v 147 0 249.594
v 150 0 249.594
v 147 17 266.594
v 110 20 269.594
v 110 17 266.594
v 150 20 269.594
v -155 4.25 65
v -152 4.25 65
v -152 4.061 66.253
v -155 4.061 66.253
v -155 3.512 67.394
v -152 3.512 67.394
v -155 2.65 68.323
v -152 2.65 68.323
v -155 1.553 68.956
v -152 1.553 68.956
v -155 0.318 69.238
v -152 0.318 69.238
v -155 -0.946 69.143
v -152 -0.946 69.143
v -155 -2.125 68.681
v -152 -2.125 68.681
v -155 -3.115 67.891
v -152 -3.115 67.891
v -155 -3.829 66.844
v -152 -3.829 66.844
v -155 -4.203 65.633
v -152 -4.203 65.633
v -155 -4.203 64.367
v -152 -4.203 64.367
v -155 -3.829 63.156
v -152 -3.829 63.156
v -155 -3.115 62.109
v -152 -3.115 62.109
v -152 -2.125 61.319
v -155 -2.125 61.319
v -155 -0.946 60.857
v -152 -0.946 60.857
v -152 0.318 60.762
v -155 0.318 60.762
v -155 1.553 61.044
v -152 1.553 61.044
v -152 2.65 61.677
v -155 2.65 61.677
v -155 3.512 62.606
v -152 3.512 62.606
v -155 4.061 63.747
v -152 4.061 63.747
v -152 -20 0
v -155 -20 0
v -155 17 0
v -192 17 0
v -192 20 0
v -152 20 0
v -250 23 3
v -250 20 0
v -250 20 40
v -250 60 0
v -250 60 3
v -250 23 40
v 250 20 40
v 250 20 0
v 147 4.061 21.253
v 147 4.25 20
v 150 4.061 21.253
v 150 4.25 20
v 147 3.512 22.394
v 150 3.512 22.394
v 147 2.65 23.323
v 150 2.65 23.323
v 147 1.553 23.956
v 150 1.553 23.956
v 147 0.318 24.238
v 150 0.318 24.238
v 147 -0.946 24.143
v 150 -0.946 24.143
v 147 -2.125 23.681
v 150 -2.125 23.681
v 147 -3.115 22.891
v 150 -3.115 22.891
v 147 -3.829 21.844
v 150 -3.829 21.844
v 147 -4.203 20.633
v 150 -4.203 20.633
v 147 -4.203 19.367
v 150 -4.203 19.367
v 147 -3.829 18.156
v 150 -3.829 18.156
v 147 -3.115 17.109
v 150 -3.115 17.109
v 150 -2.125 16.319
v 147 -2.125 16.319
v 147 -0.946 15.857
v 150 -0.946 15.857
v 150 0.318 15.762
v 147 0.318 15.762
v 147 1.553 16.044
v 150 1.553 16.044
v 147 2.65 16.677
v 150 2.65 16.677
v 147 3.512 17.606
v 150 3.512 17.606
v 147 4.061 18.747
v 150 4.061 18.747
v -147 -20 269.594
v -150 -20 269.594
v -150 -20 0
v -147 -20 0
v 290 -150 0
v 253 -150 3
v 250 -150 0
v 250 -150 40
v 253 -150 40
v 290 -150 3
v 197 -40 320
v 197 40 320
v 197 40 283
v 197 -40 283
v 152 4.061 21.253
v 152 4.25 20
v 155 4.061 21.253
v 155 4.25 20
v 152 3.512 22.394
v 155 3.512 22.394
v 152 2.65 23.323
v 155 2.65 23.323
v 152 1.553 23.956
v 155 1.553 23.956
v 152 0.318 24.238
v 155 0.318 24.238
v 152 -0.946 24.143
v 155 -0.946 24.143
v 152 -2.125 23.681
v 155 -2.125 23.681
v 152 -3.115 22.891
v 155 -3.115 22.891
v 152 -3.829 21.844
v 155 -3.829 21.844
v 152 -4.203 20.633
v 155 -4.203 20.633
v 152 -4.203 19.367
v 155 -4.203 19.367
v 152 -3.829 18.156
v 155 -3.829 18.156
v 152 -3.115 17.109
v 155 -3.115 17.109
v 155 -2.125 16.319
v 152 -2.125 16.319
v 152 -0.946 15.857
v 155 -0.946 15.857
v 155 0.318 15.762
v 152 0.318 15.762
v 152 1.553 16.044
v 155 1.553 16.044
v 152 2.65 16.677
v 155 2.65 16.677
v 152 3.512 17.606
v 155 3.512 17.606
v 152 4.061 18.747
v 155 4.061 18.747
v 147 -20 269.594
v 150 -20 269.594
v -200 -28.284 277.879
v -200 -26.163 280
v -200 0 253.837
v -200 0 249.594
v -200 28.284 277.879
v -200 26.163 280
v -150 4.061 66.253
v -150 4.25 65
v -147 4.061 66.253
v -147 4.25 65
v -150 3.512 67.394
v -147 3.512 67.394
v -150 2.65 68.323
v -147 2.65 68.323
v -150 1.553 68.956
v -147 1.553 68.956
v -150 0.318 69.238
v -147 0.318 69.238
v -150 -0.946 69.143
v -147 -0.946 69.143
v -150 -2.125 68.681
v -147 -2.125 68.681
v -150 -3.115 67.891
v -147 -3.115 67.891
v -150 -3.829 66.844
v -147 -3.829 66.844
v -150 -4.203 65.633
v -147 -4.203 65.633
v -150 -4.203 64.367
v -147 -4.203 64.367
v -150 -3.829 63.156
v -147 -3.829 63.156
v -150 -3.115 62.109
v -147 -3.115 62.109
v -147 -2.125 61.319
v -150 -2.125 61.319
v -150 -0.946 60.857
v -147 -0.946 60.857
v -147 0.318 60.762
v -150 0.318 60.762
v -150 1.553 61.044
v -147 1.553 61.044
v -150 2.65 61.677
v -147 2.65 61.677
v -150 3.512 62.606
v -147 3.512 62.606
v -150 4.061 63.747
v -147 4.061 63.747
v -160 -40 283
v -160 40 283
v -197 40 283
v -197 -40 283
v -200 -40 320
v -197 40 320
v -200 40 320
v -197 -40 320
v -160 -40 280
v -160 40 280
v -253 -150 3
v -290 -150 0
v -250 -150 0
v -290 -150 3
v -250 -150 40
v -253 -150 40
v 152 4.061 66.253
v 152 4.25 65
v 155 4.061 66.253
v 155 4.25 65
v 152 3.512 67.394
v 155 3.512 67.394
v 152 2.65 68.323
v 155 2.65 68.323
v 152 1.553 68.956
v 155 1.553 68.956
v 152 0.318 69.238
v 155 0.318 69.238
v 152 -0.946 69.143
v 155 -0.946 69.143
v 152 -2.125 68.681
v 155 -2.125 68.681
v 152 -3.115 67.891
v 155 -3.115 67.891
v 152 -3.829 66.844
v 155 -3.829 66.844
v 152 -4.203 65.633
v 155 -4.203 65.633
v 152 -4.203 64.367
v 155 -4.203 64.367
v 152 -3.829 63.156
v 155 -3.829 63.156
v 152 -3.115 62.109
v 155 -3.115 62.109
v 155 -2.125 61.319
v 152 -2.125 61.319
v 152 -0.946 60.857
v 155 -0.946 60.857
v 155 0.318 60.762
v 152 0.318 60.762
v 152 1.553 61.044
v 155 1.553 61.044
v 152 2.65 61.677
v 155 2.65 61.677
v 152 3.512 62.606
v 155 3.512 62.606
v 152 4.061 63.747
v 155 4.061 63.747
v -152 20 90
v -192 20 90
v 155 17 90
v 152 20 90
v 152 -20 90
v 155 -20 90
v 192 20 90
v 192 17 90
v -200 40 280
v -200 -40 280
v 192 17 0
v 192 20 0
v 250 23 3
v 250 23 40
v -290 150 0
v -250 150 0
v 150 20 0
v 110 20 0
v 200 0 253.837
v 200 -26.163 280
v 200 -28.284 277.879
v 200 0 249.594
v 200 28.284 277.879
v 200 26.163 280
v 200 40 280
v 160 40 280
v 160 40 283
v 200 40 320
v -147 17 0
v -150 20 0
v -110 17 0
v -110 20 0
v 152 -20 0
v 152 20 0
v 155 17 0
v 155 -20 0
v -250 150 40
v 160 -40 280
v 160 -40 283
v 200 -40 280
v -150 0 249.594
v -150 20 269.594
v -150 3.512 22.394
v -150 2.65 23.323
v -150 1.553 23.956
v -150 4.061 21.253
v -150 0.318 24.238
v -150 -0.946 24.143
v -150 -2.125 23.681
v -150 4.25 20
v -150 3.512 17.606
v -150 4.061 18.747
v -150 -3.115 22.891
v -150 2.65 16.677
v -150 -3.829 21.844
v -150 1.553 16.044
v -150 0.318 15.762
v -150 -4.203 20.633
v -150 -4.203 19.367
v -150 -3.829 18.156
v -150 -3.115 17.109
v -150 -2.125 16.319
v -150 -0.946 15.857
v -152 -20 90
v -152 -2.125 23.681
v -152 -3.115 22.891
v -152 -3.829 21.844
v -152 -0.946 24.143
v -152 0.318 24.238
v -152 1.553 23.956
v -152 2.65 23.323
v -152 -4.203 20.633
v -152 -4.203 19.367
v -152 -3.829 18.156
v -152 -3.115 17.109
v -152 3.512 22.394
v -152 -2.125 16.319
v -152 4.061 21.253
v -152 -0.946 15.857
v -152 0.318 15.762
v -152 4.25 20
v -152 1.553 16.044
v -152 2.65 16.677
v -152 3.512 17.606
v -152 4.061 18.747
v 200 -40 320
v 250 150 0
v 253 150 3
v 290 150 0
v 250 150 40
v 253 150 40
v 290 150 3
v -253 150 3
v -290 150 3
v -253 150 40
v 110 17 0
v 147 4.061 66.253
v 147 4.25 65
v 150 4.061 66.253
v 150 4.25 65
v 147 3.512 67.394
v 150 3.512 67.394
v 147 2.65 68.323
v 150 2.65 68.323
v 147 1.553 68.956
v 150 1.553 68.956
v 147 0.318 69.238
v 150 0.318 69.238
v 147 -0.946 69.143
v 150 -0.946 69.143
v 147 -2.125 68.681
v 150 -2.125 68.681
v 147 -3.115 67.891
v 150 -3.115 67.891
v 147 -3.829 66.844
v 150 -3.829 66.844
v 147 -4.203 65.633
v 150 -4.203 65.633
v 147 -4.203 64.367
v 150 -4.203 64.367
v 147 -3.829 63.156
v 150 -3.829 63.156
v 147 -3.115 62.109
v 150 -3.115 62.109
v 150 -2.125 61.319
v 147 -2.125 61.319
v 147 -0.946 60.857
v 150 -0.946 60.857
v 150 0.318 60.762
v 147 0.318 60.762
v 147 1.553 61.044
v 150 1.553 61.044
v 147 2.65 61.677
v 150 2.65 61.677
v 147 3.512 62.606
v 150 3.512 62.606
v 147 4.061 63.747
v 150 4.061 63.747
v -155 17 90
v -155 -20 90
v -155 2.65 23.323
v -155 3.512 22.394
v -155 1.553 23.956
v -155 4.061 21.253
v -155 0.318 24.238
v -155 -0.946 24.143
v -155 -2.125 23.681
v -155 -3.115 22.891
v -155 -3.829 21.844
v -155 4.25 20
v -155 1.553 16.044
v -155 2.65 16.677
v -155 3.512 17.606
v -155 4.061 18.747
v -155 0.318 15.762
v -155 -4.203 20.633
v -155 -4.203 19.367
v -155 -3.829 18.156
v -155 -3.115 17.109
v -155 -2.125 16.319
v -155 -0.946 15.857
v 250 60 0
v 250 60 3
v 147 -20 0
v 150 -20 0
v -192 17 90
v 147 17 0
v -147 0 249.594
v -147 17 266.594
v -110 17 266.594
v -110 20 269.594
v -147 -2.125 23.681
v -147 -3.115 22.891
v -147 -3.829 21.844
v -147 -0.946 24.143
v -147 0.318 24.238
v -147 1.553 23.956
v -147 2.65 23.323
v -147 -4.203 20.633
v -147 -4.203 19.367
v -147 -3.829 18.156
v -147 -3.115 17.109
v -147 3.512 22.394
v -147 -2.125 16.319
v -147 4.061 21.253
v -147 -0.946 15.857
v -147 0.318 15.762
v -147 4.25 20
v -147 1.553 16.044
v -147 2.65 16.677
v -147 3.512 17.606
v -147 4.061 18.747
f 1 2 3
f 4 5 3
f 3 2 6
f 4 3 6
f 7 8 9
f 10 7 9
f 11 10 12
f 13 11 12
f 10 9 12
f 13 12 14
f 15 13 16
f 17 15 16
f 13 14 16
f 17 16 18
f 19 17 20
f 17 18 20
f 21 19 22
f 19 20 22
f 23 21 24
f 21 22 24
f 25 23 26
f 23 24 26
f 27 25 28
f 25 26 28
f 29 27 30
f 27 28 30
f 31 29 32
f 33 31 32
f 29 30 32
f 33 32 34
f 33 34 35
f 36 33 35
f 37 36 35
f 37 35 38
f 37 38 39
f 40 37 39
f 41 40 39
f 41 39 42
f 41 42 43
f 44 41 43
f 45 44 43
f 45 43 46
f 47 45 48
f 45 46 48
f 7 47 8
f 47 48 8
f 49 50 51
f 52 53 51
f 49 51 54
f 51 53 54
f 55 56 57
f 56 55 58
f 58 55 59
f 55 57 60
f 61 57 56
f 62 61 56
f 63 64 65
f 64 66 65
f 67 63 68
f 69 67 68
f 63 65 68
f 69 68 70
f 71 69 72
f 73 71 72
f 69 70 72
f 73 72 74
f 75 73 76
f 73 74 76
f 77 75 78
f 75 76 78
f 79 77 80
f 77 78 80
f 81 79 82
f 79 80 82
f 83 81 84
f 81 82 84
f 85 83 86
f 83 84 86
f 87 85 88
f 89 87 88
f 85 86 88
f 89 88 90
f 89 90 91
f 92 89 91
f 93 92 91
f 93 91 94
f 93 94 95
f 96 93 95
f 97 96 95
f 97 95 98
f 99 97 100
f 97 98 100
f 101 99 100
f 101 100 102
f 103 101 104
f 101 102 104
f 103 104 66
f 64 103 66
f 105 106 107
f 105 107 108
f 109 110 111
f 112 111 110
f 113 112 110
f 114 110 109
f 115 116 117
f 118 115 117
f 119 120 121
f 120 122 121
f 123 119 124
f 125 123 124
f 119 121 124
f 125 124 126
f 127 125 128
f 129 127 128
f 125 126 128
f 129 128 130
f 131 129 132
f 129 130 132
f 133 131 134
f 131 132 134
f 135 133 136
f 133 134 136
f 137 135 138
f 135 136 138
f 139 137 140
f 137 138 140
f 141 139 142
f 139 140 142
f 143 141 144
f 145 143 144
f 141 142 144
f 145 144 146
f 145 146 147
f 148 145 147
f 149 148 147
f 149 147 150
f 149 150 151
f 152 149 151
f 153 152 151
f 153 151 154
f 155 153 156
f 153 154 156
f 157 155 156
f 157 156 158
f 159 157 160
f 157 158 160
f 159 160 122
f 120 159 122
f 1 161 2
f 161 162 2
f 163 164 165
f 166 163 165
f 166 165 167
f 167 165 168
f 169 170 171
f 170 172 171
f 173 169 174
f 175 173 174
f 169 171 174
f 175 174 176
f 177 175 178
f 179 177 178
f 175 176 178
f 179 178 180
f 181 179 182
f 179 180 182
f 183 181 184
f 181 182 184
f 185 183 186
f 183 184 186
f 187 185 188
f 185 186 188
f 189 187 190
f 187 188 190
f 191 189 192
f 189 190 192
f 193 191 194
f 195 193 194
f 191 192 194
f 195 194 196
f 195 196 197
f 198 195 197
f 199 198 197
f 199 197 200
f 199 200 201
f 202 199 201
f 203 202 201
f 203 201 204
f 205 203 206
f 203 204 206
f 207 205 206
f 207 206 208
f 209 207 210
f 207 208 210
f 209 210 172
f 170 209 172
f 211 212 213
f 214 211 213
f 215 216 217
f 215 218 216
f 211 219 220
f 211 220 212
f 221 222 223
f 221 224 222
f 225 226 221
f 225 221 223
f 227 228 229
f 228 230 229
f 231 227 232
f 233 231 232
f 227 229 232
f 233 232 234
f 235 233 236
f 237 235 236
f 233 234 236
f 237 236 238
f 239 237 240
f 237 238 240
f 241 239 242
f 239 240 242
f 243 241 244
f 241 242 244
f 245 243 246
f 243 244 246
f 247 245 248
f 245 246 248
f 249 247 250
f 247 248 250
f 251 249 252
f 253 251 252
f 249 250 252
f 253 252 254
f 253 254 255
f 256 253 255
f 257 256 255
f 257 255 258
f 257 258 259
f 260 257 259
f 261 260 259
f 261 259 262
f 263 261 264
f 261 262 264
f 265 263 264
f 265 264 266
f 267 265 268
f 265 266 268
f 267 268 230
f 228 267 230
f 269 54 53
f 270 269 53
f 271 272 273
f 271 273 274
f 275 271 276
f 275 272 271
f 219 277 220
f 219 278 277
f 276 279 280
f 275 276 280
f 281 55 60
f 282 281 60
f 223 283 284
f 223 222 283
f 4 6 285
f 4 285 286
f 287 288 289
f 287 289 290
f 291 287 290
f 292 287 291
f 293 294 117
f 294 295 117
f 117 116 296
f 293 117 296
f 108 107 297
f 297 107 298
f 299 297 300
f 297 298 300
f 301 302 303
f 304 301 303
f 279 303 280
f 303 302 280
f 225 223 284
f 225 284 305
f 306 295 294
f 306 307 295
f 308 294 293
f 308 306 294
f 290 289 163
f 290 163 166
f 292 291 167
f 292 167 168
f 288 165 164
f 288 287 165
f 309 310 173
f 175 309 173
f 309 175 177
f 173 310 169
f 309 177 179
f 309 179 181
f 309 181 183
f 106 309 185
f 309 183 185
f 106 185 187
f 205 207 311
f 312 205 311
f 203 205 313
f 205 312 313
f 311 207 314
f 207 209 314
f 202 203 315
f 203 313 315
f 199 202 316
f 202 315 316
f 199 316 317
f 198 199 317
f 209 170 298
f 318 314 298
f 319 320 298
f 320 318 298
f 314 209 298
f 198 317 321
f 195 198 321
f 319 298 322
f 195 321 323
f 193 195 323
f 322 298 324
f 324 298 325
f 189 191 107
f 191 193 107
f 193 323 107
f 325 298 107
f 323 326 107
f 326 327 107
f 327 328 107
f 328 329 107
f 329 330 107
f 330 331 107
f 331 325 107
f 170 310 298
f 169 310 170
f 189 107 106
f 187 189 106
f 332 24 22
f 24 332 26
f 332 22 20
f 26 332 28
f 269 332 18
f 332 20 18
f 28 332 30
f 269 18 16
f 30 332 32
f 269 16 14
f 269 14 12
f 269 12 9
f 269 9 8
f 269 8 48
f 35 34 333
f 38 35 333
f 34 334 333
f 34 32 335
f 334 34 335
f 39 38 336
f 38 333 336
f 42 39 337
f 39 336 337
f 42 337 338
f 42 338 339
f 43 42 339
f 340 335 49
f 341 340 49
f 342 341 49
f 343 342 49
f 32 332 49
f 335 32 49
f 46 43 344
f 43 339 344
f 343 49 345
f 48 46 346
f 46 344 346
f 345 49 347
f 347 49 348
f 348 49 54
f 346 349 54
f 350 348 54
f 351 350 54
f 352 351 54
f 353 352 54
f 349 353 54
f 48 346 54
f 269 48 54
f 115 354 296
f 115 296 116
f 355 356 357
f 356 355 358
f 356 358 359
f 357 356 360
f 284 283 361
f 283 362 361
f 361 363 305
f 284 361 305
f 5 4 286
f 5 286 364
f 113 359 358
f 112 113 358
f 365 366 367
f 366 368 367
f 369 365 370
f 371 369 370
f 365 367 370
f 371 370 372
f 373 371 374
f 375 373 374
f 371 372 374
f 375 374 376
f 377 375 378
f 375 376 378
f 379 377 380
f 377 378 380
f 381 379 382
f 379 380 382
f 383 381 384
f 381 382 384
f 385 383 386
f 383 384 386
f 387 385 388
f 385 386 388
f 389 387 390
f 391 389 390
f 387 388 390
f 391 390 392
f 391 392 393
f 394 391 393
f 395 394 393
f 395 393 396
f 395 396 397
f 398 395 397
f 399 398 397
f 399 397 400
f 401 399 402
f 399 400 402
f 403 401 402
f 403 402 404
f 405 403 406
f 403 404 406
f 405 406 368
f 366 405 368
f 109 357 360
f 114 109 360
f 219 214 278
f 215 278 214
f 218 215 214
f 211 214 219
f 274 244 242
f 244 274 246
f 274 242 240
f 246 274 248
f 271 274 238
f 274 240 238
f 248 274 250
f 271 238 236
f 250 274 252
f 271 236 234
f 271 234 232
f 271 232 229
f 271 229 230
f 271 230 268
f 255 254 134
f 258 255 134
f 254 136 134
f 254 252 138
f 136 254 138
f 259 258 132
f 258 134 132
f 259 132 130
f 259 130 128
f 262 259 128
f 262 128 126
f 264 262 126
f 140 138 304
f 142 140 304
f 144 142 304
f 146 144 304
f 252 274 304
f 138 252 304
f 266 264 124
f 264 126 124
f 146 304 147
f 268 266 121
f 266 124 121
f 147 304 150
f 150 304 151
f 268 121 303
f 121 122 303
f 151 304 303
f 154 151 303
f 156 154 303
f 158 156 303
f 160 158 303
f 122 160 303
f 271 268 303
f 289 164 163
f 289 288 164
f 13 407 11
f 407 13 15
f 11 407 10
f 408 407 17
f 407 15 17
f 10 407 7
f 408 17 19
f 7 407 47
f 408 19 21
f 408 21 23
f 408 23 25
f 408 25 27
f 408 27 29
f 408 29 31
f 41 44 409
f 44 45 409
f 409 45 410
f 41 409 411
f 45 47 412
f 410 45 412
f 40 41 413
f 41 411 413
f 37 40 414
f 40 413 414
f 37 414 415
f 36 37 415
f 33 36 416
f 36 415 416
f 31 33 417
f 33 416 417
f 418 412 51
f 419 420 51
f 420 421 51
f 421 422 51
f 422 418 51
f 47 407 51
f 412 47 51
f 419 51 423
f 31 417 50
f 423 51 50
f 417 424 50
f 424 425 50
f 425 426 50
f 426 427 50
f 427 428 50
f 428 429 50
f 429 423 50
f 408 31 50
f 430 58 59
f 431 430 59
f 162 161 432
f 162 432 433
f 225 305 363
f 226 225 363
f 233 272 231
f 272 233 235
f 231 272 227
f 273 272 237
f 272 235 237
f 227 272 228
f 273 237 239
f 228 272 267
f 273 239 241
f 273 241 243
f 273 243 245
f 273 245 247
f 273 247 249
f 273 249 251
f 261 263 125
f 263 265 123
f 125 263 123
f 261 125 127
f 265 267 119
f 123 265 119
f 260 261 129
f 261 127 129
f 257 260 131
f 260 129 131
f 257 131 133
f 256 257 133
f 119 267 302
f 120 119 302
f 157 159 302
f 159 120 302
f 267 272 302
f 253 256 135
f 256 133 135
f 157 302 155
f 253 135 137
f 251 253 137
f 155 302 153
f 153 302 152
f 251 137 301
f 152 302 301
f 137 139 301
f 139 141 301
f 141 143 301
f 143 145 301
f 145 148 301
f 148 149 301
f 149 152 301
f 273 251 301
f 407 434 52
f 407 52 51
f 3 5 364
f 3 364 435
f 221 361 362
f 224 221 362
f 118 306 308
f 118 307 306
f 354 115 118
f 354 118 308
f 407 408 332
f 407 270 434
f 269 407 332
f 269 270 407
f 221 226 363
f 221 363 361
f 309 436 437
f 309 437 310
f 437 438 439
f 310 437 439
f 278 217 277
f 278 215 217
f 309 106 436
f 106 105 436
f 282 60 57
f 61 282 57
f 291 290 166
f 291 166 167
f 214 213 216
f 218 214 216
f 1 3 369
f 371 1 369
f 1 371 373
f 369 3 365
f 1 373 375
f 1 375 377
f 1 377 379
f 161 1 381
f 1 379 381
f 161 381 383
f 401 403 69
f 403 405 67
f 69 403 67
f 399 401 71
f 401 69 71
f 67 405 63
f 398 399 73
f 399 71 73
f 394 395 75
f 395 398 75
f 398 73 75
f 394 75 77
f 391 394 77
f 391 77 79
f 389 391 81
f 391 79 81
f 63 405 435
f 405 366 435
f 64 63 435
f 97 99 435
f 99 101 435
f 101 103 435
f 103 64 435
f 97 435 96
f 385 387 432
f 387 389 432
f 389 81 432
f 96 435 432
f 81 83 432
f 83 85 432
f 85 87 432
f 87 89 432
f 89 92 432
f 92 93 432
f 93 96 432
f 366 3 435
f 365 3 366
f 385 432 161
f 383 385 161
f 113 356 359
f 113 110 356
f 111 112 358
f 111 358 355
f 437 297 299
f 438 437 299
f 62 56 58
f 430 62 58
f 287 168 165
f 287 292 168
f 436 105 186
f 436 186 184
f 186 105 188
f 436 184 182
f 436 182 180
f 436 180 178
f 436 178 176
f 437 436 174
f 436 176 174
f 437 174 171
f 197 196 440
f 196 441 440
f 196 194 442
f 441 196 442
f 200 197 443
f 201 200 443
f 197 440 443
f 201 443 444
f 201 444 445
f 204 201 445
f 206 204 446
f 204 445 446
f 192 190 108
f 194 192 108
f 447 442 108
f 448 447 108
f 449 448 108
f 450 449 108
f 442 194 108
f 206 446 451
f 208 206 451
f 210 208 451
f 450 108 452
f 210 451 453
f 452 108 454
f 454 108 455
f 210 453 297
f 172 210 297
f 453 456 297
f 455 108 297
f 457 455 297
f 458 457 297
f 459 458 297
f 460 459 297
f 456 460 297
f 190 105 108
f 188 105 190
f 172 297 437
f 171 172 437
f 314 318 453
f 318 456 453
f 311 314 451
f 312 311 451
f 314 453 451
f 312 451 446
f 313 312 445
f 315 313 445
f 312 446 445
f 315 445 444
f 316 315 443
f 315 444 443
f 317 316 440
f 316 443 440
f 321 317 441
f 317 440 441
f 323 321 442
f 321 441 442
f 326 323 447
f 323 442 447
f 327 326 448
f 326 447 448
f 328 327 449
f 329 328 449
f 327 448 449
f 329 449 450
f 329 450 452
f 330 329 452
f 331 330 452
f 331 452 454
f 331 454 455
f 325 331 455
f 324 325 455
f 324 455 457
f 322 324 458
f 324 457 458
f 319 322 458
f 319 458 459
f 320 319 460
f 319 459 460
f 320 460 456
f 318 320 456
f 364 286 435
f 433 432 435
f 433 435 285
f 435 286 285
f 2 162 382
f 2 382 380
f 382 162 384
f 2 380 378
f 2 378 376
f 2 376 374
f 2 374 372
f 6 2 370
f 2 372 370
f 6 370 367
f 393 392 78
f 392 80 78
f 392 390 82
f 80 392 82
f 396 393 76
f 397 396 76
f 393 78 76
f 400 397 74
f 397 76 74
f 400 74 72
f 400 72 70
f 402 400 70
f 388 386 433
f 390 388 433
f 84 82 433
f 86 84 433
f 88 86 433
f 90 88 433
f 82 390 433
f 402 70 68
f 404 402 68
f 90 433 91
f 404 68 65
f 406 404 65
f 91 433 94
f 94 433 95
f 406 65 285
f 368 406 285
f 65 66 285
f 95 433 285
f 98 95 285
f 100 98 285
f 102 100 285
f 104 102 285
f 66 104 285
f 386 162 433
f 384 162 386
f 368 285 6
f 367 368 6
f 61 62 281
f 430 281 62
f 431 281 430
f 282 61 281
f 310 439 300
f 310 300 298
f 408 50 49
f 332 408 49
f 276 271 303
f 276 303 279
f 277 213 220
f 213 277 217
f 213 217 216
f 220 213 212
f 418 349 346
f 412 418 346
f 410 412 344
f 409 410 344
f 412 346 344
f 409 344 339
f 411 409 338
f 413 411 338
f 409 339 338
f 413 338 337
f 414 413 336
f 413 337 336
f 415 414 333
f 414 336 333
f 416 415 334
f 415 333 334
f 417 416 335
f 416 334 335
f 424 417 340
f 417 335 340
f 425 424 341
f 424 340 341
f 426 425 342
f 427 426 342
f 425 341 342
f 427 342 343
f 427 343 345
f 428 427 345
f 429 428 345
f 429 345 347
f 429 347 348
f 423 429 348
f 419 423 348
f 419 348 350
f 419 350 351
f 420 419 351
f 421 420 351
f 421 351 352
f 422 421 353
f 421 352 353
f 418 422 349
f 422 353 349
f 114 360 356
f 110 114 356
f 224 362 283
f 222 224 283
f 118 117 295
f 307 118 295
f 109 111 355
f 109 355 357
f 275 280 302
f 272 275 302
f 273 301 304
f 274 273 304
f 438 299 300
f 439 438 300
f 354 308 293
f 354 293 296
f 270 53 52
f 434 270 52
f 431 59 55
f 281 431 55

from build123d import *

# Parameters (mm, degrees)
F1_DEPTH       = 200
F1_DEPTH_BACK  = 200
F3_DEPTH       = 40
F3_DEPTH_BACK  = 40
F7_DEPTH       = 250
F7_DEPTH_BACK  = 250
F9_DEPTH       = 150
F9_DEPTH_BACK  = 150
F11_DEPTH      = 90
F12_R          = 4.25
F13_DEPTH      = 155
F13_DEPTH_BACK = 155


with BuildPart() as f1:
    # F0 (on Right) → F1 (new body, two sides)
    with BuildSketch(Plane.YZ) as f1_sk:
        Polygon((-26.1629509039, 280), (-28.2842712475, 277.8786796564), (0, 249.594408409), (28.2842712475, 277.8786796564), (26.1629509039, 280), (0, 253.8370490961), align=None)
    extrude(amount=F1_DEPTH)
    extrude(f1_sk.sketch, amount=-F1_DEPTH_BACK)


with BuildPart() as f3:
    # F2 (on Front) → F3 (new body, two sides)
    with BuildSketch(Plane.XZ) as f3_sk:
        Polygon((-200, 280), (-160, 280), (-160, 283), (-197, 283), (-197, 320), (-200, 320), align=None)
    extrude(amount=F3_DEPTH)
    extrude(f3_sk.sketch, amount=-F3_DEPTH_BACK)


with BuildPart() as f3b:
    # F2 (on Front) → F3, piece 2 (new body, two sides)
    with BuildSketch(Plane.XZ) as f3_2_sk:
        Polygon((160, 280), (200, 280), (200, 320), (197, 320), (197, 283), (160, 283), align=None)
    extrude(amount=F3_DEPTH)
    extrude(f3_2_sk.sketch, amount=-F3_DEPTH_BACK)


with BuildPart() as f5:
    # F4 (on Top) → F5 (new body, up to the next surface of F1)
    with BuildSketch(Plane.XY):
        Polygon((-150, 20), (-150, -20), (-147, -20), (-147, 17), (-110, 17), (-110, 20), align=None)
    extrude(until=Until.NEXT, target=f1.part)


with BuildPart() as f5b:
    # F4 (on Top) → F5, piece 2 (new body, up to the next surface of F1)
    with BuildSketch(Plane.XY):
        Polygon((150, 20), (110, 20), (110, 17), (147, 17), (147, -20), (150, -20), align=None)
    extrude(until=Until.NEXT, target=f1.part)


with BuildPart() as f7:
    # F6 (on Right) → F7 (new body, two sides)
    with BuildSketch(Plane.YZ) as f7_sk:
        Polygon((20, 40), (20, 0), (60, 0), (60, 3), (23, 3), (23, 40), align=None)
    extrude(amount=F7_DEPTH)
    extrude(f7_sk.sketch, amount=-F7_DEPTH_BACK)


with BuildPart() as f9:
    # F8 (on Front) → F9 (new body, two sides)
    with BuildSketch(Plane.XZ) as f9_sk:
        Polygon((-290, 0), (-250, 0), (-250, 40), (-253, 40), (-253, 3), (-290, 3), align=None)
    extrude(amount=F9_DEPTH)
    extrude(f9_sk.sketch, amount=-F9_DEPTH_BACK)


with BuildPart() as f9b:
    # F8 (on Front) → F9, piece 2 (new body, two sides)
    with BuildSketch(Plane.XZ) as f9_2_sk:
        Polygon((253, 40), (250, 40), (250, 0), (290, 0), (290, 3), (253, 3), align=None)
    extrude(amount=F9_DEPTH)
    extrude(f9_2_sk.sketch, amount=-F9_DEPTH_BACK)


with BuildPart() as f11:
    # F10 (on Top) → F11 (new body)
    with BuildSketch(Plane.XY):
        Polygon((-155, -20), (-152, -20), (-152, 20), (-192, 20), (-192, 17), (-155, 17), align=None)
    extrude(amount=F11_DEPTH)


with BuildPart() as f11b:
    # F10 (on Top) → F11, piece 2 (new body)
    with BuildSketch(Plane.XY):
        Polygon((192, 17), (192, 20), (152, 20), (152, -20), (155, -20), (155, 17), align=None)
    extrude(amount=F11_DEPTH)


with BuildPart() as f13_tool:
    # F12 (on Right) → F13 (new body, two sides)
    with BuildSketch(Plane.YZ) as f13_sk:
        with Locations((0, 65)):
            Circle(F12_R)
        with Locations((0, 20)):
            Circle(F12_R)
    extrude(amount=F13_DEPTH)
    extrude(f13_sk.sketch, amount=-F13_DEPTH_BACK)


with BuildPart() as f5_1:
    add(f5.part)

    # F13: cut by f13_tool
    add(f13_tool.part, mode=Mode.SUBTRACT)


with BuildPart() as f5b_1:
    add(f5b.part)

    # F13: cut by f13_tool
    add(f13_tool.part, mode=Mode.SUBTRACT)


with BuildPart() as f11_1:
    add(f11.part)

    # F13: cut by f13_tool
    add(f13_tool.part, mode=Mode.SUBTRACT)


with BuildPart() as f11b_1:
    add(f11b.part)

    # F13: cut by f13_tool
    add(f13_tool.part, mode=Mode.SUBTRACT)


solid = Compound([f1.part, f3.part, f3b.part, f7.part, f9.part, f9b.part, f5_1.part, f5b_1.part, f11_1.part, f11b_1.part])
